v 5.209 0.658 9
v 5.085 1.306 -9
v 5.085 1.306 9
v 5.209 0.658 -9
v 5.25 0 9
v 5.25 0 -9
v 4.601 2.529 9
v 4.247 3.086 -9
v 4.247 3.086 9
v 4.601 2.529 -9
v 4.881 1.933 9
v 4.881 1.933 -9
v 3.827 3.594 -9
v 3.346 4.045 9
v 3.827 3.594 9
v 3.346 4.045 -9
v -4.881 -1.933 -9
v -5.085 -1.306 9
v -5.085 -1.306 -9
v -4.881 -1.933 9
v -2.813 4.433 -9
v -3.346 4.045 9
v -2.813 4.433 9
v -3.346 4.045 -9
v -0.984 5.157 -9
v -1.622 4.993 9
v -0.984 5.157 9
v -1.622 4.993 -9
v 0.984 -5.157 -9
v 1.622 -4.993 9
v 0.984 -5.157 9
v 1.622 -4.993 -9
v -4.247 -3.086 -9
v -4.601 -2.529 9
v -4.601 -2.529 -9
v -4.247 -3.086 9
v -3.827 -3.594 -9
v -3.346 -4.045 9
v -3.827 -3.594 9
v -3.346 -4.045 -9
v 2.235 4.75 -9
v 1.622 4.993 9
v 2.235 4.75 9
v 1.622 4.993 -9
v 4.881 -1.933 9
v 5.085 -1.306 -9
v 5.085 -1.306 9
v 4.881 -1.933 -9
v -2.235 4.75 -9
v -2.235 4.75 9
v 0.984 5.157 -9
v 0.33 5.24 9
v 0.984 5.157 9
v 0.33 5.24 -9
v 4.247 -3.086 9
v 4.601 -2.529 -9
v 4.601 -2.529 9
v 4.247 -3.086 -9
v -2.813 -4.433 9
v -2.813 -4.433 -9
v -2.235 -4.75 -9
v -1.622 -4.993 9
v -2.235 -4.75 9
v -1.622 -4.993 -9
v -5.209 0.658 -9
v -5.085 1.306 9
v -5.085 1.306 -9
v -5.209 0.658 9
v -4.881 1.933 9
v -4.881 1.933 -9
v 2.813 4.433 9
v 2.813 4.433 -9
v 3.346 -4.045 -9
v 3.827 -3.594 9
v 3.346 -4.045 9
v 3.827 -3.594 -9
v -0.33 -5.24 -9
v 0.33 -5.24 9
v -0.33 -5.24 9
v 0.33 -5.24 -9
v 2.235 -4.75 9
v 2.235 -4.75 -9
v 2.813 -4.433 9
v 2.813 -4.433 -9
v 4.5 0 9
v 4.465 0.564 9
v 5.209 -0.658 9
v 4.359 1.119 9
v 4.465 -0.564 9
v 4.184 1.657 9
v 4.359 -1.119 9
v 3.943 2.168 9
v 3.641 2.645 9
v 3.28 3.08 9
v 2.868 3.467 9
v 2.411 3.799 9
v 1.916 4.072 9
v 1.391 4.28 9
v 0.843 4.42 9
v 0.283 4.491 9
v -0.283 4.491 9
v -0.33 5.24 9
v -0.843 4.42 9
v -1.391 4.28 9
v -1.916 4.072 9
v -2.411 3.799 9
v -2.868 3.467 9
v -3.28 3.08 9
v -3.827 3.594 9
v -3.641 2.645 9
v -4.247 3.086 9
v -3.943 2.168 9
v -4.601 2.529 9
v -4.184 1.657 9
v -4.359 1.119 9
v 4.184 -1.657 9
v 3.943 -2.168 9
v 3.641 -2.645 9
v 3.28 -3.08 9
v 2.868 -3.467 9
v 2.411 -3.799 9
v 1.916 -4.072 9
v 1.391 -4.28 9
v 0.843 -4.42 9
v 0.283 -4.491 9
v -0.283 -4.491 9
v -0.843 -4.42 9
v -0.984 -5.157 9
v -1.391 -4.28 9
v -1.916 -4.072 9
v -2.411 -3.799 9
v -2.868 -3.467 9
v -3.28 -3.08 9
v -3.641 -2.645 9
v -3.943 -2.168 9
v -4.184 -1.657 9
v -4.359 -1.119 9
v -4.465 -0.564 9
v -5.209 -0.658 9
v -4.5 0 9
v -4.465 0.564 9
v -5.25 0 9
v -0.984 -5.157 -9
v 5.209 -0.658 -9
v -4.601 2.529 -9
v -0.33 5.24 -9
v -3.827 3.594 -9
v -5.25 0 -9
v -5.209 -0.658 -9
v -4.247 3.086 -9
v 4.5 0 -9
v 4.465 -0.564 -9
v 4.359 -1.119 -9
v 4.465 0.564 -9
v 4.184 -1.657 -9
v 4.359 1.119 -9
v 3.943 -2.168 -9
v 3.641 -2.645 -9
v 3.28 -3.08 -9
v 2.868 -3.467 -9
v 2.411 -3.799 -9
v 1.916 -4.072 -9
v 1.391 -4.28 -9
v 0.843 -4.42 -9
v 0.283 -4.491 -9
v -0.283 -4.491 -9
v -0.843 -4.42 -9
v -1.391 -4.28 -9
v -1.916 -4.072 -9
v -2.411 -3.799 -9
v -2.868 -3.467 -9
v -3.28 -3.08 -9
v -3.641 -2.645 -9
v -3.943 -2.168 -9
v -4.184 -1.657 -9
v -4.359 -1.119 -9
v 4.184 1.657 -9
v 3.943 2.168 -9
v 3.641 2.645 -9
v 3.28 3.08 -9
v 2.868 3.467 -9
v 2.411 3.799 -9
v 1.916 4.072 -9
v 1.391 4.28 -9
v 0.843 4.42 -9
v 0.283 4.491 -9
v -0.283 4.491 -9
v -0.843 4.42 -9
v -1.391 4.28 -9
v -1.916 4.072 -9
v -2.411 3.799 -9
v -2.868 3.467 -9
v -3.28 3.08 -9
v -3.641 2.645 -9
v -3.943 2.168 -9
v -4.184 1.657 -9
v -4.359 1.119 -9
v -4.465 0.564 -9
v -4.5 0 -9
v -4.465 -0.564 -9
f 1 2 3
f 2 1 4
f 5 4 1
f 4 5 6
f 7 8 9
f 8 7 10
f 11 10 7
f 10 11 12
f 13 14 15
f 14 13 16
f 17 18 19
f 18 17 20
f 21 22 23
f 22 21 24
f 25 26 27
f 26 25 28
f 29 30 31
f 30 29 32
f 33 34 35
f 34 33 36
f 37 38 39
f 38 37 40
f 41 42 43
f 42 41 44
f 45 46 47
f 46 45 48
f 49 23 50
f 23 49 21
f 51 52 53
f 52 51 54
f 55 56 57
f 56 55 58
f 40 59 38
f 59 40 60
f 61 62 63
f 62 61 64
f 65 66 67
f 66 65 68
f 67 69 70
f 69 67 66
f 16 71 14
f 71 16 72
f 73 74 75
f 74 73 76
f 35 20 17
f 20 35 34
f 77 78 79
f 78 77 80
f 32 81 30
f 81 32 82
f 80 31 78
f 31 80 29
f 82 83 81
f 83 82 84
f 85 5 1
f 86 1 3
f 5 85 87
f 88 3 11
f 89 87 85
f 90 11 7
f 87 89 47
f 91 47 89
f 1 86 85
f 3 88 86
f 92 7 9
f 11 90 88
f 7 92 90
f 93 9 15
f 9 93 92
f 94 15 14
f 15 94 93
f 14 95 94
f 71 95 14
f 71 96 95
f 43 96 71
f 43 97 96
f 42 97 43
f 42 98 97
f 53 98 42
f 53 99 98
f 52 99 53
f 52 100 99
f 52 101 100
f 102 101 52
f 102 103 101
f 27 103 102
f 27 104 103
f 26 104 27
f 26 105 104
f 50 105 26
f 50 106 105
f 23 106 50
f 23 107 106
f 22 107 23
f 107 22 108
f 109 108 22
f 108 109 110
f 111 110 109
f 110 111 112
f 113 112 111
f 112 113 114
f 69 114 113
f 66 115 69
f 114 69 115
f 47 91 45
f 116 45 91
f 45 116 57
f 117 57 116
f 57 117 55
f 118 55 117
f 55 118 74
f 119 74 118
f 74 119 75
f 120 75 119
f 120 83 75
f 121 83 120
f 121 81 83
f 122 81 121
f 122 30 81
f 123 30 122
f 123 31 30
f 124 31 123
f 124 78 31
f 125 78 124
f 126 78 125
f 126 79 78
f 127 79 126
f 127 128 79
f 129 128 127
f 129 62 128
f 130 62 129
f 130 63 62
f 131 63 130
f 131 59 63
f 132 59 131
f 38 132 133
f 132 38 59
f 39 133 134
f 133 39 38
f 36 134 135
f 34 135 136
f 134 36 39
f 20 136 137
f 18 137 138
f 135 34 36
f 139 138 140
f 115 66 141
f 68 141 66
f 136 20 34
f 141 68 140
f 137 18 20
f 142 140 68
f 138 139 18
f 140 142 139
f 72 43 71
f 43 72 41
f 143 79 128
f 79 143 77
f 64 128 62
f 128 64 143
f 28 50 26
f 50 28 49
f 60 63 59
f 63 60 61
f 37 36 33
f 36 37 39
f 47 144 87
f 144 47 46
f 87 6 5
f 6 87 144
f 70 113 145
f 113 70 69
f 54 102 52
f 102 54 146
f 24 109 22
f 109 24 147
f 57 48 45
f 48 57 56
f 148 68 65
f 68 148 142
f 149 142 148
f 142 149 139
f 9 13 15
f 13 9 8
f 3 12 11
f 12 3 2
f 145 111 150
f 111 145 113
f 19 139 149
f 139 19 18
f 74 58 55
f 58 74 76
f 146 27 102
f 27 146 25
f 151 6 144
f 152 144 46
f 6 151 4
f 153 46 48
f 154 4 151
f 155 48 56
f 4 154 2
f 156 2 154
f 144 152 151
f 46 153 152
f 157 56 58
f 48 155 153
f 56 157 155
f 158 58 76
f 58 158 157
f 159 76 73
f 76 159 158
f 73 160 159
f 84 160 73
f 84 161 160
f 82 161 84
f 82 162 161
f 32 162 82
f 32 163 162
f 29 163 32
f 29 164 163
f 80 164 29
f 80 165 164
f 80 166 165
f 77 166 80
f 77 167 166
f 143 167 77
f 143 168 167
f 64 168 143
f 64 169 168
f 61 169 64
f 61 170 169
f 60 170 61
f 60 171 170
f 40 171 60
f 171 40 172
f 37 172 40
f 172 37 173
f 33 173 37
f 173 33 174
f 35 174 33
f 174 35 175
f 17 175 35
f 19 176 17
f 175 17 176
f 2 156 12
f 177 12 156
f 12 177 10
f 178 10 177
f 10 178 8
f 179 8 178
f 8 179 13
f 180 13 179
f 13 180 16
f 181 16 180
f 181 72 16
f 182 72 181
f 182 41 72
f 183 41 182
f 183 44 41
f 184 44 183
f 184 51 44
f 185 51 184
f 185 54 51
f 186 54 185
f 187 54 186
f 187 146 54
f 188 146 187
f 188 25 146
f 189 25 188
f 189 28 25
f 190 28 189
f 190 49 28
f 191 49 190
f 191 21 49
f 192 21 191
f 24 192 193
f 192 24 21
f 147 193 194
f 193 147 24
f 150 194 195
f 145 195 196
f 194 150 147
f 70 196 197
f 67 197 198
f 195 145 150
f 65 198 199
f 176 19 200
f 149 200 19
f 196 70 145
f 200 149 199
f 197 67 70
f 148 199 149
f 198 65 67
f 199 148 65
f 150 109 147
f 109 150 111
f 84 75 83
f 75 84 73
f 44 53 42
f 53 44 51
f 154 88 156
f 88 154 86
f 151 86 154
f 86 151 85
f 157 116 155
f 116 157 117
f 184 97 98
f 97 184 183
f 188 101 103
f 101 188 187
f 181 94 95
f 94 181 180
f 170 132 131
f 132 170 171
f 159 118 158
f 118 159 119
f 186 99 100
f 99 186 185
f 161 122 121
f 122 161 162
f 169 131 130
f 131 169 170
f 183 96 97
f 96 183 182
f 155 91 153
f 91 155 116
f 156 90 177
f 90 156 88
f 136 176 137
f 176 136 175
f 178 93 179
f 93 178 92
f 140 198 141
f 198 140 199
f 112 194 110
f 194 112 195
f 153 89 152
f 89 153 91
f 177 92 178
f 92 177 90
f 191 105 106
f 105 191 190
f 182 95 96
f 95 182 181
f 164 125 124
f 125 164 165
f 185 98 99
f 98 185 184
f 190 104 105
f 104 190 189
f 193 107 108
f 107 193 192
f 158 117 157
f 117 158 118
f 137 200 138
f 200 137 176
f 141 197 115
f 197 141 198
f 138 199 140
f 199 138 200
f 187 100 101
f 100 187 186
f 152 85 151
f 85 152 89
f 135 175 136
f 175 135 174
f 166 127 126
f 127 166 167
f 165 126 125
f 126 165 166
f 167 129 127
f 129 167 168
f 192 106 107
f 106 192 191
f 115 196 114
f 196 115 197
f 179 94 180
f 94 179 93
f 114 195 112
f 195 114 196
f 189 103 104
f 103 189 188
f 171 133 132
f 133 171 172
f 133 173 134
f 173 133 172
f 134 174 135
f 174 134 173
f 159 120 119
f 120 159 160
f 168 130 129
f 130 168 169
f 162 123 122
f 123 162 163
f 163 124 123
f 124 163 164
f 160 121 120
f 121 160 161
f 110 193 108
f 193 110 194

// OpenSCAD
$fn = 50;


difference() {
	union() {
		translate(v = [0, 0, -9.0000000000]) {
			cylinder(h = 18, r = 5.2500000000);
		}
	}
	union() {
		translate(v = [0, 0, -100.0000000000]) {
			cylinder(h = 200, r = 4.5000000000);
		}
	}
}
